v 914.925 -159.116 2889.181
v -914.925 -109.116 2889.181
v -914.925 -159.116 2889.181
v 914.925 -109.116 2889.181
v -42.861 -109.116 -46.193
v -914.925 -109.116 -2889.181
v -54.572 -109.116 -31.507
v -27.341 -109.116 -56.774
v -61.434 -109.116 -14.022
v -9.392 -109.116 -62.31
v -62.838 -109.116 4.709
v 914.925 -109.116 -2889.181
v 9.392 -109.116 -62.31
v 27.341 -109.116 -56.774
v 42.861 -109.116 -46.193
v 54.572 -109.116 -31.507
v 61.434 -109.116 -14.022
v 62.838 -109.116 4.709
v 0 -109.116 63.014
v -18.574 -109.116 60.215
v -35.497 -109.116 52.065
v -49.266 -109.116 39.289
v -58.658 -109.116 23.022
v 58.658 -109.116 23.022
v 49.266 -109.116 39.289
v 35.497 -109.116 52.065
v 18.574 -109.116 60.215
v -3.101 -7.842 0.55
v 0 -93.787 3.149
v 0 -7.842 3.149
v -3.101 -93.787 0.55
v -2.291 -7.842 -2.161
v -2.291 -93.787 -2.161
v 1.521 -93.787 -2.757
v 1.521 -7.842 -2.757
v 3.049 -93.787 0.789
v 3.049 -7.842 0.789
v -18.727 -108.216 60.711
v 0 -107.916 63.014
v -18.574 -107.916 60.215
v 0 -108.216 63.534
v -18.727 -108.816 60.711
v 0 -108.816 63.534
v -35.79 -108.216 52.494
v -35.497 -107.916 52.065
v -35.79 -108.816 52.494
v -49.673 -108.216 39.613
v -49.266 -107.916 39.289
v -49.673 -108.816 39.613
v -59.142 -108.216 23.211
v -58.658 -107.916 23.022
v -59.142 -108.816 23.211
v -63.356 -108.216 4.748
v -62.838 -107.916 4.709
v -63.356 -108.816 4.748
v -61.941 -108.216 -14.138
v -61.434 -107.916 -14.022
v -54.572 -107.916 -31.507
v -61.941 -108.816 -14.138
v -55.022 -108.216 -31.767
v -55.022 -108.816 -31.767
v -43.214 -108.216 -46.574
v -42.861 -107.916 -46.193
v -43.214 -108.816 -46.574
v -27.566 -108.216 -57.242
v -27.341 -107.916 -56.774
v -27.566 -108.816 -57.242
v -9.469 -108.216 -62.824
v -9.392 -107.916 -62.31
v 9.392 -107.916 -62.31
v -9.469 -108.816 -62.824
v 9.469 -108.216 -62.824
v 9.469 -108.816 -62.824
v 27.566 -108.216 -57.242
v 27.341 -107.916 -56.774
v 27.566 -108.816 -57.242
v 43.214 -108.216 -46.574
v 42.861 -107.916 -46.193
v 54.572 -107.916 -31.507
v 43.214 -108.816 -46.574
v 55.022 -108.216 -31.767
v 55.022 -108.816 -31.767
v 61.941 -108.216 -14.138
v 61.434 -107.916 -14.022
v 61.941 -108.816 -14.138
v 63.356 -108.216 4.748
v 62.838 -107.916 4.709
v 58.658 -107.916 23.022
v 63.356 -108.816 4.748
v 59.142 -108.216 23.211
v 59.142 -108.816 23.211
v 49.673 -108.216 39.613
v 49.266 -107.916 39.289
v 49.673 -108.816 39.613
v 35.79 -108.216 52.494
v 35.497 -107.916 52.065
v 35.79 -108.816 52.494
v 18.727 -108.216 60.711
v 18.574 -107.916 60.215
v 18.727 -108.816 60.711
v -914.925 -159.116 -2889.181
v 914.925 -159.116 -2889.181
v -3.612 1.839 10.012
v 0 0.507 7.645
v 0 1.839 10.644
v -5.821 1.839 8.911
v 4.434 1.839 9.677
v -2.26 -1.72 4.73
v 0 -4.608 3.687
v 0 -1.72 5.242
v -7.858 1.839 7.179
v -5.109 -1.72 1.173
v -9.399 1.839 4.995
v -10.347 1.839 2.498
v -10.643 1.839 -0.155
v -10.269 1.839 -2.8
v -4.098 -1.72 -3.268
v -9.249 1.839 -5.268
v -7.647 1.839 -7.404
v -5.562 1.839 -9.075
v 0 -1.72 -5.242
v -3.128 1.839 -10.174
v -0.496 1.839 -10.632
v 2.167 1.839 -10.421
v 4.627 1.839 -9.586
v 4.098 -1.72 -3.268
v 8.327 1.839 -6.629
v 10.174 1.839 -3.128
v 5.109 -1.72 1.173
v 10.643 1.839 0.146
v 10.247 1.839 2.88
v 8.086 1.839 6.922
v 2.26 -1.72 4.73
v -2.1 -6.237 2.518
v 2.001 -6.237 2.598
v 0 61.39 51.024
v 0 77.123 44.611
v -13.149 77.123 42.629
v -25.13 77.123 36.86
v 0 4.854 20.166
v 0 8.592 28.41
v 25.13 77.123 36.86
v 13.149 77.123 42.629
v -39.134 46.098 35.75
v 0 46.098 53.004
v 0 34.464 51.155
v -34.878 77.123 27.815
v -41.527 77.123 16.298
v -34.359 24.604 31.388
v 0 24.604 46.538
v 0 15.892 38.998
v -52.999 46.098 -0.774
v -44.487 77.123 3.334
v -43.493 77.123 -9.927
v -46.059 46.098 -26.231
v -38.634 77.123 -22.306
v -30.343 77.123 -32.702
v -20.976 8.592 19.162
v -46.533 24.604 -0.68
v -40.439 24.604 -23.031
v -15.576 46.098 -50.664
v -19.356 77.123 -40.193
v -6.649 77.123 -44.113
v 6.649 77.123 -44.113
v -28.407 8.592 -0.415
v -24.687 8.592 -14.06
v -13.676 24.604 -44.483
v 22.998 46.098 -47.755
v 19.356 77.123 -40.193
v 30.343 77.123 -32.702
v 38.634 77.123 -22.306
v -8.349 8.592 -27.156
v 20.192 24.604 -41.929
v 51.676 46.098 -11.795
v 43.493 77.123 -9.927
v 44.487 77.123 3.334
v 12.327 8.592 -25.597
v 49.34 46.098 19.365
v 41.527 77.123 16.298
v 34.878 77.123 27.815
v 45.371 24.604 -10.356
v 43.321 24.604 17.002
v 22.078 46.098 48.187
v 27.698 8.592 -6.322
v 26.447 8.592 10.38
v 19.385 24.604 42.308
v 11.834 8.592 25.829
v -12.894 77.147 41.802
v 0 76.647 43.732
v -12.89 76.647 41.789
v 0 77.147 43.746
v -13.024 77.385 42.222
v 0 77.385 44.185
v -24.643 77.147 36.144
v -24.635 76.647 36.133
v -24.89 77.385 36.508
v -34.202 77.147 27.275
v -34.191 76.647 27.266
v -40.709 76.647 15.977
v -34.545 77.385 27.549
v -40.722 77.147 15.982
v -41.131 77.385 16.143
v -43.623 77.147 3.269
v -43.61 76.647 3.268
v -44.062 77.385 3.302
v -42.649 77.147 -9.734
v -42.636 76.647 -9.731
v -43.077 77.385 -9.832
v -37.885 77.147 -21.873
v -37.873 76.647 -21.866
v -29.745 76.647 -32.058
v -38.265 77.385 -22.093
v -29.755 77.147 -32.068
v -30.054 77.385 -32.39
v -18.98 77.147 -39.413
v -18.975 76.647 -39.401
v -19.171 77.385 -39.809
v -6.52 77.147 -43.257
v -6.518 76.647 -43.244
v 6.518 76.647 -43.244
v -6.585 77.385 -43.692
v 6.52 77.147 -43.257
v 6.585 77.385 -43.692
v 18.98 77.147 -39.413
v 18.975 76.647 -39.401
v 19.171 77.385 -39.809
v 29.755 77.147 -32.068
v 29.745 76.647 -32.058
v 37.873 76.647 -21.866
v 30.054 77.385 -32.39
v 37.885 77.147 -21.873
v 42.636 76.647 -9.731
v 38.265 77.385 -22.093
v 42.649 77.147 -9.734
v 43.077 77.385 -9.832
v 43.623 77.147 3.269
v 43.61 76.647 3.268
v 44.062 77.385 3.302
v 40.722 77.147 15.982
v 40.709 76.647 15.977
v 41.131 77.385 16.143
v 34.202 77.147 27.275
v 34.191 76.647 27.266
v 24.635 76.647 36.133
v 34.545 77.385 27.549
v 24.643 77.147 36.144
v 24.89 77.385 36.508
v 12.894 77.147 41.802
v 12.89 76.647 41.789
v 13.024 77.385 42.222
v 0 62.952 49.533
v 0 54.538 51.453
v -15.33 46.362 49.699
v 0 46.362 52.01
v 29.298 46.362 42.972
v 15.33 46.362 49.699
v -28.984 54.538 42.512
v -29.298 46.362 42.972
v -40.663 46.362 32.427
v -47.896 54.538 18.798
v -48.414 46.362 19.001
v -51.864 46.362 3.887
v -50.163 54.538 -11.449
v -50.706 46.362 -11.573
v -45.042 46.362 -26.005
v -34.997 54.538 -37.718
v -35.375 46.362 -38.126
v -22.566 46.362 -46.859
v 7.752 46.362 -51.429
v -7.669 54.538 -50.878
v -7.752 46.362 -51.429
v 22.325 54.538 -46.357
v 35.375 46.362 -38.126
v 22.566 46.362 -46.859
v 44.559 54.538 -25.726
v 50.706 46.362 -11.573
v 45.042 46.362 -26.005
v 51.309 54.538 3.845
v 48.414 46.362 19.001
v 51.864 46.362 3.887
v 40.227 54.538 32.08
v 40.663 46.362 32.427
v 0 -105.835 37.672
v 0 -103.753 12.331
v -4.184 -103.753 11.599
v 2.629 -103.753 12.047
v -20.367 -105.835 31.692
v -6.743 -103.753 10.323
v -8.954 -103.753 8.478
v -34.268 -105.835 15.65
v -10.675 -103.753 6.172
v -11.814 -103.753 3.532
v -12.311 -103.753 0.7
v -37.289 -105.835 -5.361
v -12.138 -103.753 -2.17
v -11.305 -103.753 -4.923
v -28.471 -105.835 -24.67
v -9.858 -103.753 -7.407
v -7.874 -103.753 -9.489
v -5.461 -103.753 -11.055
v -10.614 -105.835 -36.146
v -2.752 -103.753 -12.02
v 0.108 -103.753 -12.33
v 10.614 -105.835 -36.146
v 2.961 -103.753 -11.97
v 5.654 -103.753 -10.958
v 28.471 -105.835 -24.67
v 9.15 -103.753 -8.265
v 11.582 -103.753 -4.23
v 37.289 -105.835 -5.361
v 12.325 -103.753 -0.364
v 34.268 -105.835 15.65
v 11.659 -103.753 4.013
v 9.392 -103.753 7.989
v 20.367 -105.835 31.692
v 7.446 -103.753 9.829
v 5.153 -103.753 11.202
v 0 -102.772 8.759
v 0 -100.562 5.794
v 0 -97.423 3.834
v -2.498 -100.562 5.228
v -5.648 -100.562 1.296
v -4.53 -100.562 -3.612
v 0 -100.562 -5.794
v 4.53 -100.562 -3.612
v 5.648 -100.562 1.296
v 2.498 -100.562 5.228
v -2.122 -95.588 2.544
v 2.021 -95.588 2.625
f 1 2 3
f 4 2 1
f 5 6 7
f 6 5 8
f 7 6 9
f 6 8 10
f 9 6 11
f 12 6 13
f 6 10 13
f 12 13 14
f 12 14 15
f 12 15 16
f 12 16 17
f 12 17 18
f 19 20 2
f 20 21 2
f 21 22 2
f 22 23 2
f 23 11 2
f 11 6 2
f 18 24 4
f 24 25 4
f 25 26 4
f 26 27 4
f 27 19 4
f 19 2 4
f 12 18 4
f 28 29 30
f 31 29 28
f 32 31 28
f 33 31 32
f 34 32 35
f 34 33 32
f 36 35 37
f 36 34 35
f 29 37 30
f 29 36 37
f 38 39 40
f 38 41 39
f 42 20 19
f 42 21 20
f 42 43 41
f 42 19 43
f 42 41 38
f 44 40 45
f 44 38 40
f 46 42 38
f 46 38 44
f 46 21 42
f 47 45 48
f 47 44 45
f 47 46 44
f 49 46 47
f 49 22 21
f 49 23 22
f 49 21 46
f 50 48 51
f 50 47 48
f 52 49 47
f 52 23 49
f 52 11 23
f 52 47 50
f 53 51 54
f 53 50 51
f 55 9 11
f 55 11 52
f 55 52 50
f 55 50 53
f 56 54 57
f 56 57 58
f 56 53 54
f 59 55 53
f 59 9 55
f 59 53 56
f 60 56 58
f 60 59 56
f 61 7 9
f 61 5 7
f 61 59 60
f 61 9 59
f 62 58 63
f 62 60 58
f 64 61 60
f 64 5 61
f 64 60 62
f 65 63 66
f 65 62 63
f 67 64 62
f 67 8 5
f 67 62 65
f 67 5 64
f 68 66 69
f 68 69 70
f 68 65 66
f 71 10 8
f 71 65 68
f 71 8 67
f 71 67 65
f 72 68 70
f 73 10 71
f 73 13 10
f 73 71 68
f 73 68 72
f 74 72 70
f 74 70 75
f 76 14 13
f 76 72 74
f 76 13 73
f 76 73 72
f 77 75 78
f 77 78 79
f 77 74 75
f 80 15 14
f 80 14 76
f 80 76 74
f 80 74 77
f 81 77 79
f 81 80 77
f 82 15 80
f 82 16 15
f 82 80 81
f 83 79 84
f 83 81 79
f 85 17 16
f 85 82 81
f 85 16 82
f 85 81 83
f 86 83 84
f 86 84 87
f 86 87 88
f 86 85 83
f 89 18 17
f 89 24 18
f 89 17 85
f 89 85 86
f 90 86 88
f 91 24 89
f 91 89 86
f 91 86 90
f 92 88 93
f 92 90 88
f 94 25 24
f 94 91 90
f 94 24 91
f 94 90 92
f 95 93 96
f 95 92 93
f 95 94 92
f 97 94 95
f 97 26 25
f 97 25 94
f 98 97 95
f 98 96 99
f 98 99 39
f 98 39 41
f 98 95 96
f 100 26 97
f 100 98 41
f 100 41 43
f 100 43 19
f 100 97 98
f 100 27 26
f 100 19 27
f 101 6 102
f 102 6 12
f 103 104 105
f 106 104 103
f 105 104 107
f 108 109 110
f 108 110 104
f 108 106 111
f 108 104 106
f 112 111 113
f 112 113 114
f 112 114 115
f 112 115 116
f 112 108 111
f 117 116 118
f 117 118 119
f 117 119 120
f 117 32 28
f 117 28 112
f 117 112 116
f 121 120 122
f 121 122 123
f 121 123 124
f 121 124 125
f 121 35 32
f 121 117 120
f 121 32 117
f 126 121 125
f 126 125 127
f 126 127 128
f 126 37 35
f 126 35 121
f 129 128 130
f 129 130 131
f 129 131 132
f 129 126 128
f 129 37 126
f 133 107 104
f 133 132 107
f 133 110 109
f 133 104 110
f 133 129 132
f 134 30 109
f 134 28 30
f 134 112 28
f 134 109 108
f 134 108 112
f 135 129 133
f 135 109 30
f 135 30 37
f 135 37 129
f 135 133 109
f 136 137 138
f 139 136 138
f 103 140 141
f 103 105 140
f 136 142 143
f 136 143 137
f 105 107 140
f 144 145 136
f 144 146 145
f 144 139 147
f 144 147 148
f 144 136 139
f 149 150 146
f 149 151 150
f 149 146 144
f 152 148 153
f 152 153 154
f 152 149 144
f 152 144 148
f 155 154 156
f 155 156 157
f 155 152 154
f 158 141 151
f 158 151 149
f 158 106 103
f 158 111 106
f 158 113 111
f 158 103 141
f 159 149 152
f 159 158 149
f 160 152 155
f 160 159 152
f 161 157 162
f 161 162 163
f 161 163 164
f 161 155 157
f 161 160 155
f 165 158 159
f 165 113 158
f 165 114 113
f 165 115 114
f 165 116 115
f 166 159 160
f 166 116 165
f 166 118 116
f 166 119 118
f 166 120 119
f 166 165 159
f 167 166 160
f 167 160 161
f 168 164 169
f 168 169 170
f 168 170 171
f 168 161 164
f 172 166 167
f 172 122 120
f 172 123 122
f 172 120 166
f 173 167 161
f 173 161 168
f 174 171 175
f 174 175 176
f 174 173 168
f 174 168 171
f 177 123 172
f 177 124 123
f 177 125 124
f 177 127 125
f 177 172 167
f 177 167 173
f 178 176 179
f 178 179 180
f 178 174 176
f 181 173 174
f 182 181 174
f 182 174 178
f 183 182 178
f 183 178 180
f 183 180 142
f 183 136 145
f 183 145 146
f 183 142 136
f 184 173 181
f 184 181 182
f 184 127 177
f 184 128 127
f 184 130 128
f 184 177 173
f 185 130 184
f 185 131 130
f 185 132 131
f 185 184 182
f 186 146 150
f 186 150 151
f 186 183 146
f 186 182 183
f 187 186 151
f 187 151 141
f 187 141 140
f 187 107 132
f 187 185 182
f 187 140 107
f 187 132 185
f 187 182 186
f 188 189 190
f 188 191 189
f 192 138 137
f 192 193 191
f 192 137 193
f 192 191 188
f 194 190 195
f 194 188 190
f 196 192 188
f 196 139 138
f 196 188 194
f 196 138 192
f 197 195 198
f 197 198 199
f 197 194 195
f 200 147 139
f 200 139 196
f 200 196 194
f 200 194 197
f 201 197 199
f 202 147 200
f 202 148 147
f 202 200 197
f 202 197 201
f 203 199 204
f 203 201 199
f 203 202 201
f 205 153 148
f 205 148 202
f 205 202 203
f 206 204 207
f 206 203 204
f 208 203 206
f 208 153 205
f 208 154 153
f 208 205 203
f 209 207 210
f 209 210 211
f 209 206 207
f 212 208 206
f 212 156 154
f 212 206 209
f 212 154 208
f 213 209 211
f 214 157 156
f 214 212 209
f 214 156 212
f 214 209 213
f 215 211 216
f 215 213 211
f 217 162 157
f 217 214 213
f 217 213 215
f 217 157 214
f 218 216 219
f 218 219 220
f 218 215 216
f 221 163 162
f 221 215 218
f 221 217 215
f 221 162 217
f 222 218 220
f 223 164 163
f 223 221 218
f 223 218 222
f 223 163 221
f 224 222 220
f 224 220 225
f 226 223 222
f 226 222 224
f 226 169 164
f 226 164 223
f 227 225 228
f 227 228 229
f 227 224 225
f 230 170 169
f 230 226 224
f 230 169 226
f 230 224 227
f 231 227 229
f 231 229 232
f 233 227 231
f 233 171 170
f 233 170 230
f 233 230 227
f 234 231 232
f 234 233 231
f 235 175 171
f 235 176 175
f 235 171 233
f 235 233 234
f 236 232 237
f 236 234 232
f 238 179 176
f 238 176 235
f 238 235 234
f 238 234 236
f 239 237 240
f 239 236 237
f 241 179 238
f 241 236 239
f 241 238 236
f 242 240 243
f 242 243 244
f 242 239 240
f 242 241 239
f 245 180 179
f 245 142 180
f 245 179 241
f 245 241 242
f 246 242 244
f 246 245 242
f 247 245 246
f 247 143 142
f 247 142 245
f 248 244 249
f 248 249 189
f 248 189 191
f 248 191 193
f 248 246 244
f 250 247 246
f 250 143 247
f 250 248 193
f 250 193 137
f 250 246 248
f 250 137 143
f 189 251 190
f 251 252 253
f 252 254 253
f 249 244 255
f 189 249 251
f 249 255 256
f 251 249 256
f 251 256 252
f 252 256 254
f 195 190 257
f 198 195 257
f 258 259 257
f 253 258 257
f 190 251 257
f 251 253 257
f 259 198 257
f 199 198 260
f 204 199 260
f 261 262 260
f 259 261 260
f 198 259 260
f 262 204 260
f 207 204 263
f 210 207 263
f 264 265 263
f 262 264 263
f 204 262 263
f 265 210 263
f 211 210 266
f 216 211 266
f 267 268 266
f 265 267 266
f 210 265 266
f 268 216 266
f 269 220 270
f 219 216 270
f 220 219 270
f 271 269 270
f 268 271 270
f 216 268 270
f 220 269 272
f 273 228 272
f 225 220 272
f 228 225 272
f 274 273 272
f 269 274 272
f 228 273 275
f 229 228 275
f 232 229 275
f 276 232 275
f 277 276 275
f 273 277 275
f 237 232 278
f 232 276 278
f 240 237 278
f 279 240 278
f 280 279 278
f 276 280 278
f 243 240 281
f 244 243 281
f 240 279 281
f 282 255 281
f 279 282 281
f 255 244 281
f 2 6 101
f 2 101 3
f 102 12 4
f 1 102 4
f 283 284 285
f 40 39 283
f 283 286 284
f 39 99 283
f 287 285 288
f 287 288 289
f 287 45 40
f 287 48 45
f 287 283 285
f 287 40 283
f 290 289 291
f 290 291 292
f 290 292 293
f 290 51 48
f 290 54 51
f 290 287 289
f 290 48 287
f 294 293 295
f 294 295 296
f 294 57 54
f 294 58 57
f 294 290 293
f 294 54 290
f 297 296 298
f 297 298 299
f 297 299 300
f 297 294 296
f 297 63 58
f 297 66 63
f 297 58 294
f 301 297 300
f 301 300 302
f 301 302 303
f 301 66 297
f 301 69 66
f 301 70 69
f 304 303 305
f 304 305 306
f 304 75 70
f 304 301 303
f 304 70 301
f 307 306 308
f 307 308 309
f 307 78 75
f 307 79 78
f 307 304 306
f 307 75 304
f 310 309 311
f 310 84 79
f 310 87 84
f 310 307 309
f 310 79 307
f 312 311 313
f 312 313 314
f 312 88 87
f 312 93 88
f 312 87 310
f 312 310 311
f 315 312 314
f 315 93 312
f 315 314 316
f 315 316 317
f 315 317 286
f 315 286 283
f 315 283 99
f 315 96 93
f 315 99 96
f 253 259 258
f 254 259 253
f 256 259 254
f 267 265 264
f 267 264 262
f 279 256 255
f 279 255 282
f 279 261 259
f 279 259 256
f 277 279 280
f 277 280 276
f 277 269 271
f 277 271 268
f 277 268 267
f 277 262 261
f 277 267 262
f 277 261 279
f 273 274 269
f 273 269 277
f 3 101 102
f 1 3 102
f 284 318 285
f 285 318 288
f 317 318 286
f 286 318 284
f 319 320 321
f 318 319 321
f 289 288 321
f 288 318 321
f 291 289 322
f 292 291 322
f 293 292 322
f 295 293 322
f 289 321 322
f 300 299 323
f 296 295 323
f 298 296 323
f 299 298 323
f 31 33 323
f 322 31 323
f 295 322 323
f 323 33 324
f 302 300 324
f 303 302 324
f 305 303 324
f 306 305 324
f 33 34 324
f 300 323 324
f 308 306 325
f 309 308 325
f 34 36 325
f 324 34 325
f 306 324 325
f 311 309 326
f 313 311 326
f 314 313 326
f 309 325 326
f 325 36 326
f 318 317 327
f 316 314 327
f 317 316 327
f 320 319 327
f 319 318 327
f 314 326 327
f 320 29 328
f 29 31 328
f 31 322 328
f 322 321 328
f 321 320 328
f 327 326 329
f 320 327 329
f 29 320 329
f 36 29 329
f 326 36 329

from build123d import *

# Parameters (mm, degrees)
VERRUNDUNG1_R                   = 10
VERRUNDUNG2_R                   = 10
AUFSATZ_LINEAR_AUSTRAGEN7_REACH = 181.63
SKIZZE17_R                      = 52.009559
SKIZZE12_W                      = 1829.84992
SKIZZE12_H                      = 5778.362888
AUFSATZ_LINEAR_AUSTRAGEN2_DEPTH = 50


with BuildPart() as part:
    # Skizze1 → Rotation1 (revolve)
    with BuildSketch(Plane.XY, mode=Mode.PRIVATE) as rotation1_sk:
        with BuildLine():
            Line((0, -0.358638), (0, 0.654047))
            add(Edge.make_bspline(
                [(43.731977, 76.646752), (44.293471, 75.61022), (45.381257, 73.497126), (47.308262, 69.311193), (49.293505, 64.078527), (50.965491, 57.869253), (52.230795, 49.729178), (51.962358, 39.922418), (48.555761, 29.046311), (43.017229, 20.950675), (36.86498, 15.19718), (31.363418, 11.284496), (24.949415, 7.81674), (18.824921, 5.334533), (13.4463, 3.615433), (9.171764, 2.465213), (5.402013, 1.626403), (2.322658, 1.041392), (0.754339, 0.775081), (0, 0.654047)],
                knots=[0, 0, 0, 0, 0.03125, 0.0625, 0.125, 0.1875, 0.25, 0.375, 0.5, 0.625, 0.6875, 0.75, 0.8125, 0.875, 0.90625, 0.9375, 0.96875, 0.984375, 0.998985, 0.998985, 0.998985, 0.998985], degree=3))
            ThreePointArc((43.731977, 76.646752), (43.933462, 77.324546), (44.611255, 77.123061))
            add(Edge.make_bspline(
                [(44.611255, 77.123061), (62.984609, 43.20537), (52.583477, 8.009522), (0, -0.358638)],
                knots=[0, 0, 0, 0, 1, 1, 1, 1], degree=3))
        make_face()
    revolve(rotation1_sk.sketch.rotate(Axis((0, 82.367165, 0), (0, -1, 0)), 90), axis=Axis((0, 82.367165, 0), (0, -1, 0)))

    # Skizze2 → Rotation2 (revolve)
    with BuildSketch(Plane.XY, mode=Mode.PRIVATE) as rotation2_sk:
        with BuildLine():
            Line((3.149176, 0.183706), (3.149176, -102.999074))
            Line((3.149176, -102.999074), (63.01417, -107.91606))
            ThreePointArc((63.01417, -107.91606), (63.61417, -108.51606), (63.01417, -109.11606))
            Line((63.01417, -109.11606), (0, -109.11606))
            Line((0, -109.11606), (0, -0.358638))
            add(Edge.make_bspline(
                [(0, -0.358638), (1.067058, -0.188826), (2.116746, -0.007966), (3.149176, 0.183706)],
                knots=[0, 0, 0, 0, 0.020293, 0.020293, 0.020293, 0.020293], degree=3))
        make_face()
    revolve(rotation2_sk.sketch.rotate(Axis((0, 118.779316, 0), (0, -1, 0)), 90), axis=Axis((0, 118.779316, 0), (0, -1, 0)))

    # Verrundung1
    verrundung1_edges = [part.edges().sort_by_distance(p)[0] for p in [
        (0, -102.999074, -3.149176),
    ]]
    fillet(verrundung1_edges, radius=VERRUNDUNG1_R)

    # Verrundung2
    verrundung2_edges = [part.edges().sort_by_distance(p)[0] for p in [
        (0, 0.183706, -3.149176),
    ]]
    fillet(verrundung2_edges, radius=VERRUNDUNG2_R)

    # Skizze17 → Aufsatz-Linear austragen7 (add, up to next)
    with BuildSketch(Plane(origin=(0, 46.361876, 0), x_dir=(1, 0, 0), z_dir=(0, 1, 0)), mode=Mode.PRIVATE) as aufsatz_linear_austragen7_sk1:
        Circle(SKIZZE17_R)
    aufsatz_linear_austragen7_tool1 = extrude(aufsatz_linear_austragen7_sk1.sketch, amount=-AUFSATZ_LINEAR_AUSTRAGEN7_REACH, mode=Mode.PRIVATE) - part.part
    add(aufsatz_linear_austragen7_tool1.solids().sort_by_distance((0, 46.361876, 0))[0])

    # Skizze12 → Aufsatz-Linear austragen2 (add)
    with BuildSketch(Plane.XZ.offset(109.11606)):
        Rectangle(SKIZZE12_W, SKIZZE12_H)
    extrude(amount=AUFSATZ_LINEAR_AUSTRAGEN2_DEPTH)


solid = part.part
